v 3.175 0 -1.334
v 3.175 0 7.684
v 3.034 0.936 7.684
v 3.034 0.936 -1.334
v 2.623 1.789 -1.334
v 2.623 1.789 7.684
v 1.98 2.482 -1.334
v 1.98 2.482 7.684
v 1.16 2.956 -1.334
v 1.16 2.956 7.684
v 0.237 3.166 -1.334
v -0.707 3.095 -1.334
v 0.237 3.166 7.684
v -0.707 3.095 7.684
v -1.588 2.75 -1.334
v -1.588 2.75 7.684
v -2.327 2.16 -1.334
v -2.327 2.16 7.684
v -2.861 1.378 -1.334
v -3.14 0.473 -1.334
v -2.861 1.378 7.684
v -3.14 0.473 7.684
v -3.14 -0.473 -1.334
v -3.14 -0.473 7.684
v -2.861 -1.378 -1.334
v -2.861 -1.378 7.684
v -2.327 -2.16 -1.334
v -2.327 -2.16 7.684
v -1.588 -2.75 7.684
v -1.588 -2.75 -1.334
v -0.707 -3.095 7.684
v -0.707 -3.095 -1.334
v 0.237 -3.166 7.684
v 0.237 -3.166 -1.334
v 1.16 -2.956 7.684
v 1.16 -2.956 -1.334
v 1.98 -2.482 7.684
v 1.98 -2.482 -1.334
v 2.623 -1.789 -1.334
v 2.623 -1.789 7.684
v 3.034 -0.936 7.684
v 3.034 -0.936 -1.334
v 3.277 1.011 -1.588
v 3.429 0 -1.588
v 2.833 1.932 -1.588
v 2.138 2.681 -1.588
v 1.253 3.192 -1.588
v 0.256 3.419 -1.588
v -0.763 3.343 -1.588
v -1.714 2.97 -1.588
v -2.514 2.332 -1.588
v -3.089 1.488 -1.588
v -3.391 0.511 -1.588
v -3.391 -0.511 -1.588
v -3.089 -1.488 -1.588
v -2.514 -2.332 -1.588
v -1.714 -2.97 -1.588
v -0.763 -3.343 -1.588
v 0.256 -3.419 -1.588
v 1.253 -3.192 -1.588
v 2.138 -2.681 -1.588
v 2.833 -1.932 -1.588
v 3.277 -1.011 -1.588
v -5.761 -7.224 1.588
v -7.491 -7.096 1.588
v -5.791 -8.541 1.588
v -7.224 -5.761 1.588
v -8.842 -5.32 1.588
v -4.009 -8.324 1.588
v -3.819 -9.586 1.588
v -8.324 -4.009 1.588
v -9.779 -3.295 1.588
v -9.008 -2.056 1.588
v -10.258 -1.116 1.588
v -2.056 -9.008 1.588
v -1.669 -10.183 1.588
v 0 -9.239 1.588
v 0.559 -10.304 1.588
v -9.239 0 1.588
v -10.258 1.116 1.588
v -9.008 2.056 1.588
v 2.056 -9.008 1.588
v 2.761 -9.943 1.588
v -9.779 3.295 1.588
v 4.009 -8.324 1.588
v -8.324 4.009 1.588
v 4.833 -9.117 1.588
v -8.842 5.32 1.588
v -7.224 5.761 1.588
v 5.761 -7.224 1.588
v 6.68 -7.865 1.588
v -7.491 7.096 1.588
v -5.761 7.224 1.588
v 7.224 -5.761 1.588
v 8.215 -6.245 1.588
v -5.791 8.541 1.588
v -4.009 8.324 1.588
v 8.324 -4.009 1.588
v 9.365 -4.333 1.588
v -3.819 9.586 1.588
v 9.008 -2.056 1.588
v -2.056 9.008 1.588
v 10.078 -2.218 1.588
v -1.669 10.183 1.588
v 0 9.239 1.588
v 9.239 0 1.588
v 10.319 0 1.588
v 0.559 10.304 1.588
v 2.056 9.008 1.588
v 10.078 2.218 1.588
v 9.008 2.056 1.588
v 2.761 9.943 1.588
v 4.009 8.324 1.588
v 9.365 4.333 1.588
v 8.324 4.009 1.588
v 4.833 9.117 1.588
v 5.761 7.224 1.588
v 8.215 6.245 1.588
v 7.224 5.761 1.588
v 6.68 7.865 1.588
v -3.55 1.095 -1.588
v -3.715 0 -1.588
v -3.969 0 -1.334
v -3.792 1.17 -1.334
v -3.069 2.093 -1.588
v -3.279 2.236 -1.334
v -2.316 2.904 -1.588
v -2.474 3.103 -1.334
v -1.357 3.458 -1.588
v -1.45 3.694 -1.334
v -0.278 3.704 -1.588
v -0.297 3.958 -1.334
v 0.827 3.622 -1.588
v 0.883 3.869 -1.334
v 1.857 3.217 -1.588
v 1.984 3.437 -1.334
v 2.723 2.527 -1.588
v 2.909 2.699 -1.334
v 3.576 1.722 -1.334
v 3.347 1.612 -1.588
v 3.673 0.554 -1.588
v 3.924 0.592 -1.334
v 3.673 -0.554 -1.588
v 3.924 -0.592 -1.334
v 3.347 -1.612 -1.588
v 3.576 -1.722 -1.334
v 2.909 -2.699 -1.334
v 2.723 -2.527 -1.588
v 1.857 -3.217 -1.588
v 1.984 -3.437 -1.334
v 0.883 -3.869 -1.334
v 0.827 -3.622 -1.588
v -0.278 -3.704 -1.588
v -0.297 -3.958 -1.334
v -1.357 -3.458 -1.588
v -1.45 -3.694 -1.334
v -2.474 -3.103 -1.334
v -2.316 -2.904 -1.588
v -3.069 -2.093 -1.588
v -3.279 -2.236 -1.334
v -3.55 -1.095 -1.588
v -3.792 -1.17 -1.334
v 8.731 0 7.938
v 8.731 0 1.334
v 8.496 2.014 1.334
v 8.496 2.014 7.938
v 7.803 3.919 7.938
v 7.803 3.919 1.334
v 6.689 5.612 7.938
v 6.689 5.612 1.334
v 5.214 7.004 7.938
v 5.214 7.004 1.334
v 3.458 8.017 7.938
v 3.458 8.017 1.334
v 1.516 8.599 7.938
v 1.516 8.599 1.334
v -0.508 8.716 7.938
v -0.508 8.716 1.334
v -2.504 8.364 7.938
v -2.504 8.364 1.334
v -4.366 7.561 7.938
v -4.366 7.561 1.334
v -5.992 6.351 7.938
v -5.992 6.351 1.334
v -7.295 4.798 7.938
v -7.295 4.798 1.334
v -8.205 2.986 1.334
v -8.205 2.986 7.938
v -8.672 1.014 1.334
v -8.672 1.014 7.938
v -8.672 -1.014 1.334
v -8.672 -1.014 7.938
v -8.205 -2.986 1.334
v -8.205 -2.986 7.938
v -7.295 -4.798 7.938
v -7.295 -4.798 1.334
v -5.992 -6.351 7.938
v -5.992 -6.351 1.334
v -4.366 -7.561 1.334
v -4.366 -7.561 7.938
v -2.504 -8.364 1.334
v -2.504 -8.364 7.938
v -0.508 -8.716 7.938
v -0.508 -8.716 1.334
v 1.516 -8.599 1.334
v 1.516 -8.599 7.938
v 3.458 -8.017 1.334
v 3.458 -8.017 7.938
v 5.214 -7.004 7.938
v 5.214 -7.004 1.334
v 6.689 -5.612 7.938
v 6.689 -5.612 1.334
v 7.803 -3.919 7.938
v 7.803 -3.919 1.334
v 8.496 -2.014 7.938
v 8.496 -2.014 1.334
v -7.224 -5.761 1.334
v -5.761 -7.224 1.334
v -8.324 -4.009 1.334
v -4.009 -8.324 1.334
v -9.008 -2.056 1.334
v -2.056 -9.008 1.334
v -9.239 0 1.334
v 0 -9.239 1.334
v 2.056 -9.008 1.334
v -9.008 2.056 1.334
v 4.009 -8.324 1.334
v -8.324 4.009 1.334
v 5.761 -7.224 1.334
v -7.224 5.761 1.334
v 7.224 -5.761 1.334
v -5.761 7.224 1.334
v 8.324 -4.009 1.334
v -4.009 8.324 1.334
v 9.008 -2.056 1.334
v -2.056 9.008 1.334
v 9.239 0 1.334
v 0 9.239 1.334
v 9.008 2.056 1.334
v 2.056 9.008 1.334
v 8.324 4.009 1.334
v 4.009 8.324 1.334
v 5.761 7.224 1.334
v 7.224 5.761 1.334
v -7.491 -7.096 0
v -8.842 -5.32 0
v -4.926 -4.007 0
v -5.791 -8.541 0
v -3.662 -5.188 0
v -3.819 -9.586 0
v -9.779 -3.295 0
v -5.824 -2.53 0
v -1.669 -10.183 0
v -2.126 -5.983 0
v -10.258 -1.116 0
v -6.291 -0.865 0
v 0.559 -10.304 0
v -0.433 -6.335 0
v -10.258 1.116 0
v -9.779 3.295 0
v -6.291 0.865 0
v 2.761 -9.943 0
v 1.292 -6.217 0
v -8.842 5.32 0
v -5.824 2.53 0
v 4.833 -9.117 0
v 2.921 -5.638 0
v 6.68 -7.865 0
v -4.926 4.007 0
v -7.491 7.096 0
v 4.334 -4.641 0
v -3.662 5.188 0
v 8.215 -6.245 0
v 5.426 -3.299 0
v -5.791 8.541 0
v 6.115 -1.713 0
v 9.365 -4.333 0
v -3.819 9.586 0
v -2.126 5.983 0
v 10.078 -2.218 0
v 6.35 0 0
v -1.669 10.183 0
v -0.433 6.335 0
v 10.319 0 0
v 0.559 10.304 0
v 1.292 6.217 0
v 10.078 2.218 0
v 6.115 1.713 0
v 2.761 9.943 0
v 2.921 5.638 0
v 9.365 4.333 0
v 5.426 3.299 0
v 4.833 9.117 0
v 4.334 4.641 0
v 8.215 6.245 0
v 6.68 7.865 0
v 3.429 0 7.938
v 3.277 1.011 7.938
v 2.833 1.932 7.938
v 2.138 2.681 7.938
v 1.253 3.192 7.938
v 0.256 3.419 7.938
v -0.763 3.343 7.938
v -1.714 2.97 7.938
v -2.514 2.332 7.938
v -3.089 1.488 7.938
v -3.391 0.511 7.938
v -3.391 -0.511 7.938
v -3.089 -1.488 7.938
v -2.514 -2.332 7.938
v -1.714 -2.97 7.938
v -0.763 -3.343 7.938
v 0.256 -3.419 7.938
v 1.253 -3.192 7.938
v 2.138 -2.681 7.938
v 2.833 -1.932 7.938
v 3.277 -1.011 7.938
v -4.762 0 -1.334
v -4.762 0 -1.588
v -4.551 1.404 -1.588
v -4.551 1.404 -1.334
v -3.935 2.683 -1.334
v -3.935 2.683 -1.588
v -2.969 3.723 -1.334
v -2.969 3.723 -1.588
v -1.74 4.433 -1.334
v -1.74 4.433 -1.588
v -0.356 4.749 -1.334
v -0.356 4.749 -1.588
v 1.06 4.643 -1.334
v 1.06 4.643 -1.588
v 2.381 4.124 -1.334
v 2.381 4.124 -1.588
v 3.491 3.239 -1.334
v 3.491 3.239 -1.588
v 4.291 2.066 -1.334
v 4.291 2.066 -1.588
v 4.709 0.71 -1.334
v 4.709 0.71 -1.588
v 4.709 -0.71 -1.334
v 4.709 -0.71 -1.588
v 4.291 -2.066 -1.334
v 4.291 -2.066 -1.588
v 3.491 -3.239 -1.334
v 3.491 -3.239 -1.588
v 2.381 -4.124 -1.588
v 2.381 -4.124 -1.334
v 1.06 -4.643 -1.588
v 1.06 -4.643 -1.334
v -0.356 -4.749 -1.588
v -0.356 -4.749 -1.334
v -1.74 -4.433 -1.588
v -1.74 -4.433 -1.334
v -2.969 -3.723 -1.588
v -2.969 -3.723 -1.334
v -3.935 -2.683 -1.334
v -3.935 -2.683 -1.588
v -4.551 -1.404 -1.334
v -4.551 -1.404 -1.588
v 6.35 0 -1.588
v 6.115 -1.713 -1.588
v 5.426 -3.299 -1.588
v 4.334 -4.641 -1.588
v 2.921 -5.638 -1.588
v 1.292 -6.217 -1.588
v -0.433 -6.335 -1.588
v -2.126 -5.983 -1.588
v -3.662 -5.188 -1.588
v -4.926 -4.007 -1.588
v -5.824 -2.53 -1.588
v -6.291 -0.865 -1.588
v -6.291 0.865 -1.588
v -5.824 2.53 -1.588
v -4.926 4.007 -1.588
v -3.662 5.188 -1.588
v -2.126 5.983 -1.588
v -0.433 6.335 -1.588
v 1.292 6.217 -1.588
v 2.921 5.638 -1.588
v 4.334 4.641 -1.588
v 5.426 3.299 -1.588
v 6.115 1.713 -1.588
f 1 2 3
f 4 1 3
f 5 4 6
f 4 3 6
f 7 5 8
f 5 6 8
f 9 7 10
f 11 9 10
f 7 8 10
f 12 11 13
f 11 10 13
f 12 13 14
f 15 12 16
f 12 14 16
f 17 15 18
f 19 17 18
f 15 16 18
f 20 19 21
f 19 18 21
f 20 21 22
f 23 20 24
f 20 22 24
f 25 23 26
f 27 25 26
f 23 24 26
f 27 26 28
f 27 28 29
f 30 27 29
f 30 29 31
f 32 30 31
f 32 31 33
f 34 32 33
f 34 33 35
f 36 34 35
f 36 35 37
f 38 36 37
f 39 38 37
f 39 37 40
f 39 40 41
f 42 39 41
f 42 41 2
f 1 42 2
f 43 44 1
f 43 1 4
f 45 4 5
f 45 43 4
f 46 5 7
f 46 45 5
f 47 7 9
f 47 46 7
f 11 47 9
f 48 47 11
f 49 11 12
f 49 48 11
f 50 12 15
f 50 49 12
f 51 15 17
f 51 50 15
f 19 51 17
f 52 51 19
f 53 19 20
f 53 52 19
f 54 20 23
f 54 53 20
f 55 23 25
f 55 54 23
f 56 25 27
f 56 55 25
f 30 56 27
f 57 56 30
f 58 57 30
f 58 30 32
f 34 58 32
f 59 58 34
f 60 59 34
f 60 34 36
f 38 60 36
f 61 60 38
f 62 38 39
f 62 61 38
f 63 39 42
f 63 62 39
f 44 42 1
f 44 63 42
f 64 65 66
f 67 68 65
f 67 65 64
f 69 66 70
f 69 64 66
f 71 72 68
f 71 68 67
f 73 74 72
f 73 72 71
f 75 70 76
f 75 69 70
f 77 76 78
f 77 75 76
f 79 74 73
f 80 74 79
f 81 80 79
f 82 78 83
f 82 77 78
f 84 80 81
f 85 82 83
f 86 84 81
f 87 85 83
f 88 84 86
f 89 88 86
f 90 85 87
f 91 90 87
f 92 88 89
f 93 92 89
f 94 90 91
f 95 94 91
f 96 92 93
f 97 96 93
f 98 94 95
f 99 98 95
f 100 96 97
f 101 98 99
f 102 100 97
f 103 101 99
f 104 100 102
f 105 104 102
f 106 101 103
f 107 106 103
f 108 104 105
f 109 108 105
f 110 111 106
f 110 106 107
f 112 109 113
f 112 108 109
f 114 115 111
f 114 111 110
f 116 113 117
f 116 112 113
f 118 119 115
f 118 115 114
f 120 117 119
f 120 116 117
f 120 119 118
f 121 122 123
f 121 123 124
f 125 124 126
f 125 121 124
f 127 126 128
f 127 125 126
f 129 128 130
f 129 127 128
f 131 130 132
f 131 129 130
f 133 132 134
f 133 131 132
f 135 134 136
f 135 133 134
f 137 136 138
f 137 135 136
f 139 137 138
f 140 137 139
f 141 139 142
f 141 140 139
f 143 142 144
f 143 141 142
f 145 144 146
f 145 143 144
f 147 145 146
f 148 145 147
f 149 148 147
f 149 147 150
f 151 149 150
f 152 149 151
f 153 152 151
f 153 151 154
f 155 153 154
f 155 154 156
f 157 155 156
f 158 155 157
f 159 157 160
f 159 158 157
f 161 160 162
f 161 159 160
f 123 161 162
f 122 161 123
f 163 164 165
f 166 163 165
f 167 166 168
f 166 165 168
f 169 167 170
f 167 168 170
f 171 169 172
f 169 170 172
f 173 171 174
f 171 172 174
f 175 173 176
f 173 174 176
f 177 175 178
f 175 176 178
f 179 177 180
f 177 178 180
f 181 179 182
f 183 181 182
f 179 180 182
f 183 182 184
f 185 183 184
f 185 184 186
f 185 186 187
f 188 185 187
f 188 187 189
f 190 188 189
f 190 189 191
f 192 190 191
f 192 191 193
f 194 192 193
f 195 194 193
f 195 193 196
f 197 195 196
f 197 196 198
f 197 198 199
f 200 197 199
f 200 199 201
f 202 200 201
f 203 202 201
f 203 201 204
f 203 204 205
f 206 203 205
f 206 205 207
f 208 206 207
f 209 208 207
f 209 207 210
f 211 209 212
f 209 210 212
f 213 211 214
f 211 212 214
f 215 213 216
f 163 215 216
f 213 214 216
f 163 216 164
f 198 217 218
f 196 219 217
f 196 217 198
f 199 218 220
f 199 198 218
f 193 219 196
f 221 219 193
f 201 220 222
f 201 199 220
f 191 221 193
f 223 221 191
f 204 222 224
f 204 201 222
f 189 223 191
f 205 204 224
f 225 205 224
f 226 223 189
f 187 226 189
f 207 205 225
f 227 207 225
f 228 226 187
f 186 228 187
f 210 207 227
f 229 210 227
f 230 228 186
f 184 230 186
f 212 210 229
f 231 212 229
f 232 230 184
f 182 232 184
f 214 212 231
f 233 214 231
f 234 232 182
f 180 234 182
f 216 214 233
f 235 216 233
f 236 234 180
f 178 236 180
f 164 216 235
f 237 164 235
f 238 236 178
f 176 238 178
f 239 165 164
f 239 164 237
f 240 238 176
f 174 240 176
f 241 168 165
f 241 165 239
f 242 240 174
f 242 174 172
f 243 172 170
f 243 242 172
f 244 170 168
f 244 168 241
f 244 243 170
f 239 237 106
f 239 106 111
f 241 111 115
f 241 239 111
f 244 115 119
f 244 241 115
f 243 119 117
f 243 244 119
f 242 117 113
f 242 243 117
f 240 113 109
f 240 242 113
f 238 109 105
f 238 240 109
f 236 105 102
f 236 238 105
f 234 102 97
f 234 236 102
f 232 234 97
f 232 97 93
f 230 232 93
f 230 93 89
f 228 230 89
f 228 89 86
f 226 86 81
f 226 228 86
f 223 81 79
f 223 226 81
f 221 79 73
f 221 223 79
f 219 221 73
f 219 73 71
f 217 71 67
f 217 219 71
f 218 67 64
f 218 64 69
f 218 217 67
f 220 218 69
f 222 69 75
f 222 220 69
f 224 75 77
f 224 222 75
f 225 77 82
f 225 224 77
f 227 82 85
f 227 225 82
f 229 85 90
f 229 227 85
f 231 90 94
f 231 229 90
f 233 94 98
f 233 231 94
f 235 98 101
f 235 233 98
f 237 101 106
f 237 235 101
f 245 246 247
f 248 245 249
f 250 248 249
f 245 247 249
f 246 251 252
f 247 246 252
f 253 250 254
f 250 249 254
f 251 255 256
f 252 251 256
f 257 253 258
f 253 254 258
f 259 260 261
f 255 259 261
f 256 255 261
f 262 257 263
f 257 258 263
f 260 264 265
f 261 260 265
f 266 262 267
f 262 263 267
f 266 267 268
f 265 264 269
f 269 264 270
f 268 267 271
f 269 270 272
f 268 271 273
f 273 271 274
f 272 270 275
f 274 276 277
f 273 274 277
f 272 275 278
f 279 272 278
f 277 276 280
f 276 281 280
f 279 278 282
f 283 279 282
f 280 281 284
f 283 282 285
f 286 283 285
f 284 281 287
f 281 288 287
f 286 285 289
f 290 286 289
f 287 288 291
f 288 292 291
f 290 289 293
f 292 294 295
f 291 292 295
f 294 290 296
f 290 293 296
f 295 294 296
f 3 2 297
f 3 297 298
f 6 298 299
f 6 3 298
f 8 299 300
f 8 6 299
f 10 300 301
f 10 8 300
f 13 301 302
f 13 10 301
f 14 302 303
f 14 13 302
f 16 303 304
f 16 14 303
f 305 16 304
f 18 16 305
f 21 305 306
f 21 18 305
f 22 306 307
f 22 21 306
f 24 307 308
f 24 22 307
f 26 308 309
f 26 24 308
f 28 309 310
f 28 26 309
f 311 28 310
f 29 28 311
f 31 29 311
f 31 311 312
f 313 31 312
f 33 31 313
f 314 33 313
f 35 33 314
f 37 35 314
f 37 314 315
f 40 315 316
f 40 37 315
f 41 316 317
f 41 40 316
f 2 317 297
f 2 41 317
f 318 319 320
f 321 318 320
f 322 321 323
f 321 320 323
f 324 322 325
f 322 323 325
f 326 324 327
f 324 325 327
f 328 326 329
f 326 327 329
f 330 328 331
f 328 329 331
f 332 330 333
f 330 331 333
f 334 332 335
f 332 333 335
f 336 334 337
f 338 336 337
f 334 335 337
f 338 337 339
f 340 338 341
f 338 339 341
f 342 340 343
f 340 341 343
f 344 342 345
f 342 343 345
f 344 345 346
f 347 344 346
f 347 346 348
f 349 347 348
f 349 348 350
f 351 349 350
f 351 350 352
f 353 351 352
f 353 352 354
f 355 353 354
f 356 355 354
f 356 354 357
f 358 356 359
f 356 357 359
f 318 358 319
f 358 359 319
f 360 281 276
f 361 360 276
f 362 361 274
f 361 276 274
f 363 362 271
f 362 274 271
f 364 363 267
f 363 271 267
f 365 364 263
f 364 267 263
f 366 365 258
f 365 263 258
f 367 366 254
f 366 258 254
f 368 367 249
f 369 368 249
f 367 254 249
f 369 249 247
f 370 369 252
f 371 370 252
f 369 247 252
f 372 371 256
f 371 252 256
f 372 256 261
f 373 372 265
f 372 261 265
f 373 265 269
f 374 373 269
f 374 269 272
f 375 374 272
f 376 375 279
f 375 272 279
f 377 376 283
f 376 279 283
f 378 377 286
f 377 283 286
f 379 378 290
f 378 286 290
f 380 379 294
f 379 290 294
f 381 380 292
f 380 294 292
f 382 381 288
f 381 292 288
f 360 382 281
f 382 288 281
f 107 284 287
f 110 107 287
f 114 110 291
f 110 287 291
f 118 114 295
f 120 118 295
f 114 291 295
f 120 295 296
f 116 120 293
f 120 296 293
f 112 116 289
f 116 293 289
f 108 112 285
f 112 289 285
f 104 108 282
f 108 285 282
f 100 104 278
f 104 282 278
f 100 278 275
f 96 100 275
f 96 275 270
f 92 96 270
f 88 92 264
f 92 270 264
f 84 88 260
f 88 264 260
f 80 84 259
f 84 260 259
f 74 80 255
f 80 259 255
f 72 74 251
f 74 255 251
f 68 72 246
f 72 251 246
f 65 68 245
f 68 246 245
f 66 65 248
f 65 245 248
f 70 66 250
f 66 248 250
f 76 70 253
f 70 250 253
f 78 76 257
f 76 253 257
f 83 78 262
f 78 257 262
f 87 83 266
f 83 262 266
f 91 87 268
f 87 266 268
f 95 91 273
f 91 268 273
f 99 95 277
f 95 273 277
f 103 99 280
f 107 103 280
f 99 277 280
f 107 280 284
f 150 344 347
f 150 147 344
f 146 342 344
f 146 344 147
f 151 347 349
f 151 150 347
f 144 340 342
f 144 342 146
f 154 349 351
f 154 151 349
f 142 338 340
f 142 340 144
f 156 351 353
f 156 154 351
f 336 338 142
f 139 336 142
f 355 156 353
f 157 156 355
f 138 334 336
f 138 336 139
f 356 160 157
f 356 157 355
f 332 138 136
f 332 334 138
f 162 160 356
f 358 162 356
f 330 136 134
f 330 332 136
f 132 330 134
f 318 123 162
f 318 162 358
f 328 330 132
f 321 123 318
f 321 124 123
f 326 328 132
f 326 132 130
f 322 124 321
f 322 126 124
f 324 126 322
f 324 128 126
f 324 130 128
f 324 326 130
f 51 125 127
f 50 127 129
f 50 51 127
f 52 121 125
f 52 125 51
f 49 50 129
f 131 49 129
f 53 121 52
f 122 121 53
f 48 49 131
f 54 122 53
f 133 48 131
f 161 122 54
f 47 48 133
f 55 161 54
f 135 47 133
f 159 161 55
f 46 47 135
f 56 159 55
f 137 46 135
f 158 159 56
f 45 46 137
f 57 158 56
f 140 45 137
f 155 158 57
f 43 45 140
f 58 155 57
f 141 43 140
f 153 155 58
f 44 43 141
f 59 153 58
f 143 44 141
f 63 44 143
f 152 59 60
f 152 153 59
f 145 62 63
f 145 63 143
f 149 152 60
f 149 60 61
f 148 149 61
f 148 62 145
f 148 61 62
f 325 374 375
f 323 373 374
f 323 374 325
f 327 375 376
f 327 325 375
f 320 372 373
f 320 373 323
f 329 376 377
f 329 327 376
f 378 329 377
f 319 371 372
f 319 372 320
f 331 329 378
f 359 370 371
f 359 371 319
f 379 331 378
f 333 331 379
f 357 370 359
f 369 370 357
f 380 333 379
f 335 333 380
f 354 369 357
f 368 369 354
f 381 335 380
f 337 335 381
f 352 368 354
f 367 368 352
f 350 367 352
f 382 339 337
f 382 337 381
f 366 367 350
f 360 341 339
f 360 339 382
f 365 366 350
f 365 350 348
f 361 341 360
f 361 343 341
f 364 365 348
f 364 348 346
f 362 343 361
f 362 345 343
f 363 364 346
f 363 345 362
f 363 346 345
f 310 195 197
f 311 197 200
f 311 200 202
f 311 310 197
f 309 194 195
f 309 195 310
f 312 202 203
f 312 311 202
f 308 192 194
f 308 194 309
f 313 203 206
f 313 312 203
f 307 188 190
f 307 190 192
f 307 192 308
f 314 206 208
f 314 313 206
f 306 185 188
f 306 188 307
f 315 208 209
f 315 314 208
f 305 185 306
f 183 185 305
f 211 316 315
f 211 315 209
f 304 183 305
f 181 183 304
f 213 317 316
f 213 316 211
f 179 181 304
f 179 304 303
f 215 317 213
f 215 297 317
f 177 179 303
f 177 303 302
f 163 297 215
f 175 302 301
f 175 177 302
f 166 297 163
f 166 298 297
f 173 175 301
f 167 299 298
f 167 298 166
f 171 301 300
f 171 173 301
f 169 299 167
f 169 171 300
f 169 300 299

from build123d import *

# Parameters (mm, degrees)
SKETCH1_R           = 10.31875
BOSS_EXTRUDE1_DEPTH = 1.5875
SKETCH2_R           = 8.73125
BOSS_EXTRUDE2_DEPTH = 6.35
SKETCH3_R           = 6.35
BOSS_EXTRUDE3_DEPTH = 1.5875
SKETCH4_R           = 4.7625
SKETCH4_R_2         = 3.96875
CUT_EXTRUDE1_DEPTH  = 0.254
CUT_EXTRUDE2_START  = -0.254
SKETCH5_R           = 9.23925
SKETCH5_R_2         = 8.73125
CUT_EXTRUDE2_DEPTH  = 0.254
SKETCH6_R           = 3.175
CUT_EXTRUDE3_DEPTH  = 18.426383105
CHAMFER1_SIZE       = 0.254


with BuildPart() as part:
    # Sketch1 → Boss-Extrude1 (new body)
    with BuildSketch(Plane.XY):
        Circle(SKETCH1_R)
    extrude(amount=BOSS_EXTRUDE1_DEPTH)

    # Sketch2 → Boss-Extrude2 (add)
    with BuildSketch(Plane.XY.offset(1.5875)):
        Circle(SKETCH2_R)
    extrude(amount=BOSS_EXTRUDE2_DEPTH)

    # Sketch3 → Boss-Extrude3 (add)
    with BuildSketch(Plane(origin=(0, 0, 0), x_dir=(-1, 0, 0), z_dir=(0, 0, -1))):
        with Locations(Location((0, 0, 0), (0, 0, 180))):
            Circle(SKETCH3_R)
    extrude(amount=BOSS_EXTRUDE3_DEPTH)

    # Sketch4 → Cut-Extrude1 (cut)
    with BuildSketch(Plane(origin=(0, 0, -1.5875), x_dir=(-1, 0, 0), z_dir=(0, 0, -1))):
        Circle(SKETCH4_R)
        Circle(SKETCH4_R_2, mode=Mode.SUBTRACT)
    extrude(amount=-CUT_EXTRUDE1_DEPTH, mode=Mode.SUBTRACT)

    # Sketch5 → Cut-Extrude2 (cut)
    with BuildSketch(Plane.XY.offset(1.5875).offset(CUT_EXTRUDE2_START)):
        Circle(SKETCH5_R)
        Circle(SKETCH5_R_2, mode=Mode.SUBTRACT)
    extrude(amount=CUT_EXTRUDE2_DEPTH, mode=Mode.SUBTRACT)

    # Sketch6 → Cut-Extrude3 (cut, through all)
    with BuildSketch(Plane.XY.offset(7.9375)):
        Circle(SKETCH6_R)
    extrude(amount=-CUT_EXTRUDE3_DEPTH, mode=Mode.SUBTRACT)

    # Chamfer1
    chamfer1_edges = [part.edges().sort_by_distance(p)[0] for p in [
        (3.96875, 0, -1.5875),
        (-3.175, 0, -1.5875),
        (-3.175, 0, 7.9375),
    ]]
    chamfer(chamfer1_edges, length=CHAMFER1_SIZE - 0.0001)  # a hair under: the kernel refuses the full size


solid = part.part
